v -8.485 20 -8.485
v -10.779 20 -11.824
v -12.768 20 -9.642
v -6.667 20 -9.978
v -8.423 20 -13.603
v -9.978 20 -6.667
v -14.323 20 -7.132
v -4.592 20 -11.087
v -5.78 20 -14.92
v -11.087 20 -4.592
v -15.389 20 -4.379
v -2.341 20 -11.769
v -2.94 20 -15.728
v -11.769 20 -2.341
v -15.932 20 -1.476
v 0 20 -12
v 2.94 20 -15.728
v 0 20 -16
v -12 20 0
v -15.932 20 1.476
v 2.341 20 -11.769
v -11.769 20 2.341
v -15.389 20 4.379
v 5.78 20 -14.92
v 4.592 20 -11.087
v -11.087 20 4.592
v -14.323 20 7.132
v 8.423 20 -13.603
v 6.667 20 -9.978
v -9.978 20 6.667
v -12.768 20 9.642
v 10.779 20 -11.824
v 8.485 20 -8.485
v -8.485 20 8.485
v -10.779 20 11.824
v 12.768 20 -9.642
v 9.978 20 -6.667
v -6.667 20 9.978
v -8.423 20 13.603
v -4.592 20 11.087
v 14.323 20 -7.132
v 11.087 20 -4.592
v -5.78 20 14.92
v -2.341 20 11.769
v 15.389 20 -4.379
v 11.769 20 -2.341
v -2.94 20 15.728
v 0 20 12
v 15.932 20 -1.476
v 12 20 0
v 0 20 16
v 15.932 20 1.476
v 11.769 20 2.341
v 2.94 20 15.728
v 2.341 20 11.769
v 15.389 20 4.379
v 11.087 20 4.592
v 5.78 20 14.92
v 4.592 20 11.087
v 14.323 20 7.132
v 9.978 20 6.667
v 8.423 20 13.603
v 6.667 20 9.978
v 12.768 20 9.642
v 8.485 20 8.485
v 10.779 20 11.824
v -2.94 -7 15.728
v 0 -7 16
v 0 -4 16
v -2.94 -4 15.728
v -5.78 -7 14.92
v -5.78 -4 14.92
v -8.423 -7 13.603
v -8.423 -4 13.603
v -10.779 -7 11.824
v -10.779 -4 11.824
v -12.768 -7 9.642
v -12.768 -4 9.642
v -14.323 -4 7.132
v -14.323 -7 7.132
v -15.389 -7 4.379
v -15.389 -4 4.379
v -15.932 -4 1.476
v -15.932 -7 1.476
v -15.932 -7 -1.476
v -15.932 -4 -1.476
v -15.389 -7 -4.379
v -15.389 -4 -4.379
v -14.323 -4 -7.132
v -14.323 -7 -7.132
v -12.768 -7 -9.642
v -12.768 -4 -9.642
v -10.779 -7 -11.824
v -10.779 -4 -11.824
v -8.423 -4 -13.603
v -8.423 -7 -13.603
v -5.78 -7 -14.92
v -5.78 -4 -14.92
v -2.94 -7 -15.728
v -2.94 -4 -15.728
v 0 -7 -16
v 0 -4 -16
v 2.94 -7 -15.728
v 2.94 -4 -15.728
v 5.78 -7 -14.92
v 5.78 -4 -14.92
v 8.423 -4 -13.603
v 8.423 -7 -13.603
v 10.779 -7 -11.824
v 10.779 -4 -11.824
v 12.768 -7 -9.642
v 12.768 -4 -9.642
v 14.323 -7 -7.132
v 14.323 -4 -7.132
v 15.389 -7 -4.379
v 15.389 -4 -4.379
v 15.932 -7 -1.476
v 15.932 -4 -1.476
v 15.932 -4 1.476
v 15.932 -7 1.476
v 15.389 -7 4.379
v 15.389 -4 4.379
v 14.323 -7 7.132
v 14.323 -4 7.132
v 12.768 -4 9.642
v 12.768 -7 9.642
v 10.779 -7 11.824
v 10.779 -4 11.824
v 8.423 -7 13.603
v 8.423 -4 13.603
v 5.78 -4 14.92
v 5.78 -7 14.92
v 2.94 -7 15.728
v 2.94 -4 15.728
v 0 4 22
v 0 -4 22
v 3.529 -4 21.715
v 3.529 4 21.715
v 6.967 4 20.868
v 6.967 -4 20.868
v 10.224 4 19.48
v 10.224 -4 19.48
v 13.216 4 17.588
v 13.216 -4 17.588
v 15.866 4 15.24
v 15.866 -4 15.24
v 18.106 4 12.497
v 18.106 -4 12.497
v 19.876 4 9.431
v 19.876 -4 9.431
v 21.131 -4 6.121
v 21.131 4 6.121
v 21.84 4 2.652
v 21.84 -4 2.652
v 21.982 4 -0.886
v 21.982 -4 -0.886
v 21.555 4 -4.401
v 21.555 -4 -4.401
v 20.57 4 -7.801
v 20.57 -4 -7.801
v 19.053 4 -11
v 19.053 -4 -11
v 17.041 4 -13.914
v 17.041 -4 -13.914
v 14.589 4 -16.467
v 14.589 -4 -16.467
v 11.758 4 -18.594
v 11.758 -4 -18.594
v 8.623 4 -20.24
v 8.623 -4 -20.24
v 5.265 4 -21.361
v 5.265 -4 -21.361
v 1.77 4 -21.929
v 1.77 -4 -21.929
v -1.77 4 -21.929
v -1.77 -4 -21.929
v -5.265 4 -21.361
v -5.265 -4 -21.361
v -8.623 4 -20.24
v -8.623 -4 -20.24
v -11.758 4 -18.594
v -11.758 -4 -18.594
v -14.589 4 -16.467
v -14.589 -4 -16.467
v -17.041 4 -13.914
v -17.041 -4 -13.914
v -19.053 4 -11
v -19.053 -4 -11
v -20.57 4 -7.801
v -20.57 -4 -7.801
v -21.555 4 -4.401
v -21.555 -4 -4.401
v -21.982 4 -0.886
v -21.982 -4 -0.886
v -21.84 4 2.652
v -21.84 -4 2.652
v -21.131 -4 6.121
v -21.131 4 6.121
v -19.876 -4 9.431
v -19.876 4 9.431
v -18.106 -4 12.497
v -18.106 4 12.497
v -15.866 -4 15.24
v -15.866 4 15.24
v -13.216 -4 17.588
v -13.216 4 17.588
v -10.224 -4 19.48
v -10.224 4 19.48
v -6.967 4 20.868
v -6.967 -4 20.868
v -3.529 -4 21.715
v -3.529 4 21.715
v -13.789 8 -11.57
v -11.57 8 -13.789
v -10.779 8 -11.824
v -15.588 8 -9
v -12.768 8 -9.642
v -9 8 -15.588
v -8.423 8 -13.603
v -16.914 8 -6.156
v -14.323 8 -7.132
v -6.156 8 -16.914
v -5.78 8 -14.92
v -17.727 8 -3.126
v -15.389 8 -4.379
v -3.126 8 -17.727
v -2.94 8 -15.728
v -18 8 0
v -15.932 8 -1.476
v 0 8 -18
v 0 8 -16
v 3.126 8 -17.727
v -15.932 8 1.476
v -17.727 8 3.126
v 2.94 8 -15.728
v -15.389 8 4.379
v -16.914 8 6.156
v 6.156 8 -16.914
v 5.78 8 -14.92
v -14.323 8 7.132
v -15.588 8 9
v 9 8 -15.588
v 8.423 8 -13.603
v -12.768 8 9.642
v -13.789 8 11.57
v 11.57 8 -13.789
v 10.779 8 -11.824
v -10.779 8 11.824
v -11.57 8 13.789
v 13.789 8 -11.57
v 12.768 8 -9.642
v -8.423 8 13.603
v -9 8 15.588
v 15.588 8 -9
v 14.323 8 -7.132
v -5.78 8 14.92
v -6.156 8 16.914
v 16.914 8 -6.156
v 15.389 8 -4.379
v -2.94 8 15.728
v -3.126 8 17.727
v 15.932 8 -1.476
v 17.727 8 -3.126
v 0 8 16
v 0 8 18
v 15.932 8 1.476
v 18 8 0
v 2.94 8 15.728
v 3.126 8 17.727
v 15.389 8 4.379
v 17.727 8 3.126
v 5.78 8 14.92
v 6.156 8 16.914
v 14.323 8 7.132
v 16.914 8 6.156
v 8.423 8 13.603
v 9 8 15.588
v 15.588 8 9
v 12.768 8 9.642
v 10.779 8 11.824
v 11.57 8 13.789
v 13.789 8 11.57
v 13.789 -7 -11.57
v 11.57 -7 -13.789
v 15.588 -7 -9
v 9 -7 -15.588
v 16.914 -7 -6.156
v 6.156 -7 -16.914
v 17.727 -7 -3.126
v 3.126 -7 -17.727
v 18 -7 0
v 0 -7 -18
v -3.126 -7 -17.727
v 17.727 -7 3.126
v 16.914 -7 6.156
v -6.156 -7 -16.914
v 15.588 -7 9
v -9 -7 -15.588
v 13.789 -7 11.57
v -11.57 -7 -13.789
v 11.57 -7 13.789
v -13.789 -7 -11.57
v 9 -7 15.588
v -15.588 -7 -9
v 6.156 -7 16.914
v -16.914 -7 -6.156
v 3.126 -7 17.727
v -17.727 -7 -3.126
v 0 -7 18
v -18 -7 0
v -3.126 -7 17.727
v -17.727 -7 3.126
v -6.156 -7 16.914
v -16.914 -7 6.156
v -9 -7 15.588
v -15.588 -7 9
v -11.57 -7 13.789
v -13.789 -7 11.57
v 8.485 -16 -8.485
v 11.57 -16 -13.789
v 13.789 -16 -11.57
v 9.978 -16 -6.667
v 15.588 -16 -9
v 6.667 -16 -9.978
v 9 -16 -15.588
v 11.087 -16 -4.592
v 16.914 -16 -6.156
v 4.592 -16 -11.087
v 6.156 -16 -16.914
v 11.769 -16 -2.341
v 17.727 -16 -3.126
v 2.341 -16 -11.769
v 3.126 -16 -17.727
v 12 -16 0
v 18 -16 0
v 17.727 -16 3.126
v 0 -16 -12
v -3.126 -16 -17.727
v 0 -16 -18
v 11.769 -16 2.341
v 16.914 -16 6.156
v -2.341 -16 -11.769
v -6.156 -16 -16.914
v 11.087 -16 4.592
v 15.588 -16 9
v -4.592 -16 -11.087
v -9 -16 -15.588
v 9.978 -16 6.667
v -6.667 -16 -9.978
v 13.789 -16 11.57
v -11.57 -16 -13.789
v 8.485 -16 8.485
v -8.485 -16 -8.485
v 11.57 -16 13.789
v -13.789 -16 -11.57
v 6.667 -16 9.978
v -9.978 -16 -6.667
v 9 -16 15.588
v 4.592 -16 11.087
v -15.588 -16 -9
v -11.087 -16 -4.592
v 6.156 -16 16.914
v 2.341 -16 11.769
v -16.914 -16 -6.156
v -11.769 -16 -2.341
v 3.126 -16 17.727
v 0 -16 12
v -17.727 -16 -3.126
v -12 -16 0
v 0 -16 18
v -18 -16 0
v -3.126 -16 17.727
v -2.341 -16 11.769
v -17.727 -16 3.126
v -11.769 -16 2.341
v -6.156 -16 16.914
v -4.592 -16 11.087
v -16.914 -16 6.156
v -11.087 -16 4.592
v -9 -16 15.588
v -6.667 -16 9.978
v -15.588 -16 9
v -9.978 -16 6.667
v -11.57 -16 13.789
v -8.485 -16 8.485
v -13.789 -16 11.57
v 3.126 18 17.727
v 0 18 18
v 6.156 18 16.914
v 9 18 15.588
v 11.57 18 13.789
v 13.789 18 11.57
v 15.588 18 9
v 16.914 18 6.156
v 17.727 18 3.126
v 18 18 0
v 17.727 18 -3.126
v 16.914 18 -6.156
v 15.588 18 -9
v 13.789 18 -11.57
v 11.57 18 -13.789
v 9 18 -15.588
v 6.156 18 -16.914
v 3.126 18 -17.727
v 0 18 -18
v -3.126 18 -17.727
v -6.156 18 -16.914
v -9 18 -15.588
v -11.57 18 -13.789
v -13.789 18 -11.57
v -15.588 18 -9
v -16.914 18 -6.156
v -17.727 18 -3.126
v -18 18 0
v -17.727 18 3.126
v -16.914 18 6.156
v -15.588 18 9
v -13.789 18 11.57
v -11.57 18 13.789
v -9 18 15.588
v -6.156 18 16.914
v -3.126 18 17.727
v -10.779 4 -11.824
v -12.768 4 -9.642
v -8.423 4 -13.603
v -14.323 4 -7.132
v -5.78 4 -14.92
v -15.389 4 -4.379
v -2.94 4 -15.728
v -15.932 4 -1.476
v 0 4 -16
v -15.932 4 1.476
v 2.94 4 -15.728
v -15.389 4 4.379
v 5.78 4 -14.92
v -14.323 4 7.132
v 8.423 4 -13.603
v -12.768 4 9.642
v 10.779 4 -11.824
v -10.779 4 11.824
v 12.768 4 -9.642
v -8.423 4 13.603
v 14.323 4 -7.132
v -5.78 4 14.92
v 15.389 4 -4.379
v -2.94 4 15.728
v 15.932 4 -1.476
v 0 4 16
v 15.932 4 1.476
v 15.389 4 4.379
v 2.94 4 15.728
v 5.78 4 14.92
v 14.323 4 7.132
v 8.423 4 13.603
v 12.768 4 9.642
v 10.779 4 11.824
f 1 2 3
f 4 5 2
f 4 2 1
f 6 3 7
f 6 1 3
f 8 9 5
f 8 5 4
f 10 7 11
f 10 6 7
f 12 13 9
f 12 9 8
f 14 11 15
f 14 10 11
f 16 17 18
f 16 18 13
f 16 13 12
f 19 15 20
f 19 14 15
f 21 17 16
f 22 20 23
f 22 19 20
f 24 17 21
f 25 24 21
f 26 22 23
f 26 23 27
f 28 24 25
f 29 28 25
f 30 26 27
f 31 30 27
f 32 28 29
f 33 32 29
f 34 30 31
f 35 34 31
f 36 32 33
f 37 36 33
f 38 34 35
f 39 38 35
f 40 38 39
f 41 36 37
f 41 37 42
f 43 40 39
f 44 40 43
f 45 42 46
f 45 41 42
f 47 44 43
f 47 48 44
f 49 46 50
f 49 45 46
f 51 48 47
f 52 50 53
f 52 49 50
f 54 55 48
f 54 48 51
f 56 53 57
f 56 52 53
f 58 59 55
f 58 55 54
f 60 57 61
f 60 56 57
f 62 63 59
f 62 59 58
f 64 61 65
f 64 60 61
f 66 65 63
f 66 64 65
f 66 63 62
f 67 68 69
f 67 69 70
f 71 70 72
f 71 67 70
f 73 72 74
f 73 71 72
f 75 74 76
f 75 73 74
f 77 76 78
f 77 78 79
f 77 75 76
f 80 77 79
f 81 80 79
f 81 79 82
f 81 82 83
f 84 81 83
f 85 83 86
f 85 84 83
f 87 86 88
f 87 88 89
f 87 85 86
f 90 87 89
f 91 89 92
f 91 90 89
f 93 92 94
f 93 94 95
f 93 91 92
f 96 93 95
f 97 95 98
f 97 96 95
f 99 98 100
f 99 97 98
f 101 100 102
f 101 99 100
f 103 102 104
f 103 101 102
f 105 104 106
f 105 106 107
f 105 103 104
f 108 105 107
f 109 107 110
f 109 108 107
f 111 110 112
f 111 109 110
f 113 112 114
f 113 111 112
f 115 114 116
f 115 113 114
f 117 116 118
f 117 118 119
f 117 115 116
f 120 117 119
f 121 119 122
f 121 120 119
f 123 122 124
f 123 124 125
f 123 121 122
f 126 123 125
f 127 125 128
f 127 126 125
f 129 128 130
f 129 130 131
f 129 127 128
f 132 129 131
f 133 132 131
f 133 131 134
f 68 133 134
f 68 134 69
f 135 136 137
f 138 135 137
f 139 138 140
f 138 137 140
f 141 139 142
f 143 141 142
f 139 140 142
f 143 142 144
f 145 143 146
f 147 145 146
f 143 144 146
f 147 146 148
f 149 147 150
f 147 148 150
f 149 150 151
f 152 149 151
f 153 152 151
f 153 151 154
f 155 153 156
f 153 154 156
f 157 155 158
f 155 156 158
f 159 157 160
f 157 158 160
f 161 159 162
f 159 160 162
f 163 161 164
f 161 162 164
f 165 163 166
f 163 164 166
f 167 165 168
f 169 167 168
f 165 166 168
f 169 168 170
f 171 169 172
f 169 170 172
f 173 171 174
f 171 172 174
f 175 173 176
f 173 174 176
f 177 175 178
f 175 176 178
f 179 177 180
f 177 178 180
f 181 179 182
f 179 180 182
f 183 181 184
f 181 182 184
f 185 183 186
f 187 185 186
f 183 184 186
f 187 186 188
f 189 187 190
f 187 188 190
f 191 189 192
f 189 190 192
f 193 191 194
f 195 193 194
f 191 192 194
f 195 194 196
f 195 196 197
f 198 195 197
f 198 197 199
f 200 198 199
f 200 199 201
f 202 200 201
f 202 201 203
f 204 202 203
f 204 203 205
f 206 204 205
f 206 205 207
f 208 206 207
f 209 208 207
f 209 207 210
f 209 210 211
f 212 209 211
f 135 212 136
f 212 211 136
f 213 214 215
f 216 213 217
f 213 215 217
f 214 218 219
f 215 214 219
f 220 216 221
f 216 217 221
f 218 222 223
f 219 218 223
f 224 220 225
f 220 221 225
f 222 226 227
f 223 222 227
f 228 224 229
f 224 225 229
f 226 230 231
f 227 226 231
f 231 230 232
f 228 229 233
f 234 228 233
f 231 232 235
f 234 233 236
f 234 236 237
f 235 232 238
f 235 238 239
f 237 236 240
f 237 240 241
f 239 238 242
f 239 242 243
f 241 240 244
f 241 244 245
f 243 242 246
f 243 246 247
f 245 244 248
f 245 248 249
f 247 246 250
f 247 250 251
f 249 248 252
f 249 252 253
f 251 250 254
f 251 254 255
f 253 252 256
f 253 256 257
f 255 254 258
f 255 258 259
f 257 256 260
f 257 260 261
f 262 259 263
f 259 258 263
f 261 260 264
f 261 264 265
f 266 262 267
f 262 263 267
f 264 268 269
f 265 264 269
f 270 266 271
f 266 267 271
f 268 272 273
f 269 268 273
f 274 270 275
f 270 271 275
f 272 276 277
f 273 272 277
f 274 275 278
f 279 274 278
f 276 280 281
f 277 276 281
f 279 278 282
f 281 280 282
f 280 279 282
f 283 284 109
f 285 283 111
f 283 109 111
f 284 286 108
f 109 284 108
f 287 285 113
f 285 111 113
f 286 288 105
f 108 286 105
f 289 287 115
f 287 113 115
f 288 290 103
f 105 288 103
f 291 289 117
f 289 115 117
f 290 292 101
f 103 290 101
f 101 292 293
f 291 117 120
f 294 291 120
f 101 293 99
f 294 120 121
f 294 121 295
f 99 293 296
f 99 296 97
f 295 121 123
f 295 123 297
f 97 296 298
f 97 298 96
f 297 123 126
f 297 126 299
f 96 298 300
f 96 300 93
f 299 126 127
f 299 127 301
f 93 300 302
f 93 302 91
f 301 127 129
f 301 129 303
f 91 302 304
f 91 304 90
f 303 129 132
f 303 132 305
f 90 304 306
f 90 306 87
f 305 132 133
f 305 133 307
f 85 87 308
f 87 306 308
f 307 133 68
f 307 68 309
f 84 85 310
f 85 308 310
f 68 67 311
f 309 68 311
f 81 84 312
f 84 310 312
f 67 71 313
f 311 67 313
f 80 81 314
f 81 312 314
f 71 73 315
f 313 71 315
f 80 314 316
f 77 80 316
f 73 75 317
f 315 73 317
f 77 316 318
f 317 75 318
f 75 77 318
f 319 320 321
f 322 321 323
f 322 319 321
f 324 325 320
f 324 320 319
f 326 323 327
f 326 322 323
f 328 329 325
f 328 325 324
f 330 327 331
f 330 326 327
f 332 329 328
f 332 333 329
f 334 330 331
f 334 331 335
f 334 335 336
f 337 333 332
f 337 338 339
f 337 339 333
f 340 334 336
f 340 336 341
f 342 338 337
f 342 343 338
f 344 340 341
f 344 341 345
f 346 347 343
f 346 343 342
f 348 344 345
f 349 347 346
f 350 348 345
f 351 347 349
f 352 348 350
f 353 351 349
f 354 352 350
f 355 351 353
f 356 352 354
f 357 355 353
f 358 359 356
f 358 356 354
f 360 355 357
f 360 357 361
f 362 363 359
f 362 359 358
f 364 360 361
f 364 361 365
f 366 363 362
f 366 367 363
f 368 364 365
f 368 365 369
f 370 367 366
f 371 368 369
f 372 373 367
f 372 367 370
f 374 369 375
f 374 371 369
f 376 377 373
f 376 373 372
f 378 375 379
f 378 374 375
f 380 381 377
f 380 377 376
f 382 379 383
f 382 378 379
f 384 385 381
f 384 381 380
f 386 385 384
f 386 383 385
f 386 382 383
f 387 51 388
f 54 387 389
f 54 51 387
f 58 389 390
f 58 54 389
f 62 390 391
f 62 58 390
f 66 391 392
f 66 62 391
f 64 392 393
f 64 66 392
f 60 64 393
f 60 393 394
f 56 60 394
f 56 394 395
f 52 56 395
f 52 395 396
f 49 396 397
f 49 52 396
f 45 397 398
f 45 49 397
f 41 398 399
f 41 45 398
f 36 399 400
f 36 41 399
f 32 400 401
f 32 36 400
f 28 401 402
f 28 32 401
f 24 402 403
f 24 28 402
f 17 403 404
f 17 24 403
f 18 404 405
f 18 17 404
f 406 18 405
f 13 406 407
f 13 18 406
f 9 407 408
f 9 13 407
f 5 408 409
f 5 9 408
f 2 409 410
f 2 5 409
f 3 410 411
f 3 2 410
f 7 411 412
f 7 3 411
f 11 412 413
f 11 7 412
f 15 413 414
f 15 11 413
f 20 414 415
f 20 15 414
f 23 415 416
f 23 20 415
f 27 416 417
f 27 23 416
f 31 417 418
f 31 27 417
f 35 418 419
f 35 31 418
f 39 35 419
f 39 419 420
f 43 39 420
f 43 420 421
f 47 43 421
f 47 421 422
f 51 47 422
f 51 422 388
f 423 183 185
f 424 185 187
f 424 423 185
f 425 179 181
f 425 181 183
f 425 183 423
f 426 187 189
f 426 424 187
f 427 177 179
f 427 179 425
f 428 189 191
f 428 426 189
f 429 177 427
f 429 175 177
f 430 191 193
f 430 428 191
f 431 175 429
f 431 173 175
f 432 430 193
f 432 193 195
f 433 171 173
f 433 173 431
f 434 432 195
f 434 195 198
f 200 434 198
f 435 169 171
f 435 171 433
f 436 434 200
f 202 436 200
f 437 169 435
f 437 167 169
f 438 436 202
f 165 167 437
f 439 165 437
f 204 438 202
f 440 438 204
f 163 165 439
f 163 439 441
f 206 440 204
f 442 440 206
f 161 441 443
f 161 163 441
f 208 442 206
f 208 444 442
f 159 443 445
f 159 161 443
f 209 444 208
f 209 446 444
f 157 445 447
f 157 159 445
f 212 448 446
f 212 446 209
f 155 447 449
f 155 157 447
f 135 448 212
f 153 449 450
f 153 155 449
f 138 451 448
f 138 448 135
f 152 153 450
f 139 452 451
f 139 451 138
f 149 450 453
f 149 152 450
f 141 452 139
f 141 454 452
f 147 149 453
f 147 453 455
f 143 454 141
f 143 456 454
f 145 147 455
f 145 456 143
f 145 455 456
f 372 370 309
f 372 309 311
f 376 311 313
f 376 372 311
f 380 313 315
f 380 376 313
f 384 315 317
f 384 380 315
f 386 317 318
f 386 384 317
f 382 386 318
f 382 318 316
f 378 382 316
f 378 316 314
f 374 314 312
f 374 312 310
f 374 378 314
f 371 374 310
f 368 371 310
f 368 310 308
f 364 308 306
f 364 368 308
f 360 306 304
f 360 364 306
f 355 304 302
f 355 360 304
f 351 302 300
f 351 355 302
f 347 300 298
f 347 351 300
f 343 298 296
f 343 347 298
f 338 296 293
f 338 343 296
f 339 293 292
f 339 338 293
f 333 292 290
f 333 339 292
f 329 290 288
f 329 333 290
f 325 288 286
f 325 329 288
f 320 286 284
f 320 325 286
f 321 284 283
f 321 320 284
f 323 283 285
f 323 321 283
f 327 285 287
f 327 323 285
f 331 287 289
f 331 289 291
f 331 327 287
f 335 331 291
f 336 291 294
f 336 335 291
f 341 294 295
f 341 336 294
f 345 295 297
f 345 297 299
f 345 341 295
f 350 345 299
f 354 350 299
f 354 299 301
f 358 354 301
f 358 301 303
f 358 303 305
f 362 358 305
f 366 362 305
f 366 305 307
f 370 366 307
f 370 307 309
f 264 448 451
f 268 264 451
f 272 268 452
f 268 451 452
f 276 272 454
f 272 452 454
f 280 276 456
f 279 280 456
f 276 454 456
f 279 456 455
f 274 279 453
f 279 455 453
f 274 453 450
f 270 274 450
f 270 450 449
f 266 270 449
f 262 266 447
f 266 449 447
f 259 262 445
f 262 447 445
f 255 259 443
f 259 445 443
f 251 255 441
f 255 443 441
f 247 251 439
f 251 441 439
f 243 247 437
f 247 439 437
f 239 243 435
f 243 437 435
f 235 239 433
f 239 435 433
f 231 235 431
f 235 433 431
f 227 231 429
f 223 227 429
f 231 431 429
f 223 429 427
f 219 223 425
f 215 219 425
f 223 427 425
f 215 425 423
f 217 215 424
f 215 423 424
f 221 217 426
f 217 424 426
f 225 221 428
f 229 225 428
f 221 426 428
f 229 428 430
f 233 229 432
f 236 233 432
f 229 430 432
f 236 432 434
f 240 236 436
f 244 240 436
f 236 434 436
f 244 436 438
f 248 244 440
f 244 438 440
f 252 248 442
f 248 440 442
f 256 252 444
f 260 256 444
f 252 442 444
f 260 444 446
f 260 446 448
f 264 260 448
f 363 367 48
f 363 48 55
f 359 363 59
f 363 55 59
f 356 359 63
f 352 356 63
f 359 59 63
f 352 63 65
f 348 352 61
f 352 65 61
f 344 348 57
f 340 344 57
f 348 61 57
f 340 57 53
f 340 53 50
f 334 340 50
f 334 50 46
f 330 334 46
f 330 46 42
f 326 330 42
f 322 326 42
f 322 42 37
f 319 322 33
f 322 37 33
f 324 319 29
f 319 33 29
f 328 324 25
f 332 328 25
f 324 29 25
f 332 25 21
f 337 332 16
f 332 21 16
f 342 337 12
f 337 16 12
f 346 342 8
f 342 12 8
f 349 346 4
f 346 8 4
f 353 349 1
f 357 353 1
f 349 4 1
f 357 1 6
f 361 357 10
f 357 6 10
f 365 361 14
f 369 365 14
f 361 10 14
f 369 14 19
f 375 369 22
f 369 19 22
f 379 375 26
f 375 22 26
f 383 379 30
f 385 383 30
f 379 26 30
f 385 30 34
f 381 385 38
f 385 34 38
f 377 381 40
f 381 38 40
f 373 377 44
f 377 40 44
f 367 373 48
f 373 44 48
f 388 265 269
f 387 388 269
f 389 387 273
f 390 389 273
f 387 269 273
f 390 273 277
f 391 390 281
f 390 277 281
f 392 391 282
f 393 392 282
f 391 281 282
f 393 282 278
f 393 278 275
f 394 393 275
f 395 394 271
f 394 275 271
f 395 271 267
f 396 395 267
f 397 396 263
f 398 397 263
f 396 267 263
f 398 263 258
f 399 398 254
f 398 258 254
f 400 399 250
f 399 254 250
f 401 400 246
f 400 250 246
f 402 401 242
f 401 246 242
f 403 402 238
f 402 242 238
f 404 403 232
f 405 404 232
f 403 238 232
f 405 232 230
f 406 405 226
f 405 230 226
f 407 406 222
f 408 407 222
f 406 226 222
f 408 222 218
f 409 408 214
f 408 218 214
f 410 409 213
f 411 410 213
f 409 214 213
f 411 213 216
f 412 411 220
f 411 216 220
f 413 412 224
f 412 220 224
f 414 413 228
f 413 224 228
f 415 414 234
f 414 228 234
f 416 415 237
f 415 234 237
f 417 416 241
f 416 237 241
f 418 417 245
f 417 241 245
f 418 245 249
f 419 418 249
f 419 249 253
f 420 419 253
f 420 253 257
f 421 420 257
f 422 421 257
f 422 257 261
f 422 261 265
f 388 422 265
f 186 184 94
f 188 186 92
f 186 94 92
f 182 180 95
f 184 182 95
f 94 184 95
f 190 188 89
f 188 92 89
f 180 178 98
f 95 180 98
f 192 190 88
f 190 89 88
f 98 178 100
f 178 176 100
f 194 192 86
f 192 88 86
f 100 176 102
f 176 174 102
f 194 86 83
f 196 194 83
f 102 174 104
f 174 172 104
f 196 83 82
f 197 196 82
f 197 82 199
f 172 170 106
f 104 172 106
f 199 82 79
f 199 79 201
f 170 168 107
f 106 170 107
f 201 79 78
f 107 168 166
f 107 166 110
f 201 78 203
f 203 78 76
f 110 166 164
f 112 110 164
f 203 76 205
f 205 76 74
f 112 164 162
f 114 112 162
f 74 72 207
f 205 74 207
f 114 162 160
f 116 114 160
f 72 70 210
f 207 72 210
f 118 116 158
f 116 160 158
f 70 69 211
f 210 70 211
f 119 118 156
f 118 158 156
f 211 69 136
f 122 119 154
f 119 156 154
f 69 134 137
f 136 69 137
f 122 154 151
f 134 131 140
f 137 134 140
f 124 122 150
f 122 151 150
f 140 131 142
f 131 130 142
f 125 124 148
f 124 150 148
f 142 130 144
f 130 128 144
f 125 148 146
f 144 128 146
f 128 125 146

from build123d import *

# Parameters (mm, degrees)
BOSS_EXTRUDE1_DEPTH      = 4
BOSS_EXTRUDE1_DEPTH_BACK = 4
SKETCH1_R                = 22
SKETCH2_R                = 16
BOSS_EXTRUDE2_DEPTH      = 4
SKETCH3_R                = 18
BOSS_EXTRUDE3_DEPTH      = 12
BOSS_EXTRUDE4_START      = 3
SKETCH4_R                = 16
BOSS_EXTRUDE4_DEPTH      = 3
BOSS_EXTRUDE5_START      = 9
SKETCH5_R                = 18
BOSS_EXTRUDE5_DEPTH      = 9
CHAMFER1_SIZE            = 2
SKETCH6_R                = 12
CUT_EXTRUDE1_DEPTH       = 36


with BuildPart() as part:
    # Sketch1 → Boss-Extrude1 (new, two sides: drawn at the far end of the back side and taken through both)
    with BuildSketch(Plane(origin=(0, 0, 0), x_dir=(1, 0, 0), z_dir=(0, 1, 0)).offset(-BOSS_EXTRUDE1_DEPTH_BACK)):
        with Locations(Location((0, 0, 0), (0, 0, 270))):
            Circle(SKETCH1_R)
    extrude(amount=BOSS_EXTRUDE1_DEPTH + BOSS_EXTRUDE1_DEPTH_BACK)

    # Sketch2 → Boss-Extrude2 (add)
    with BuildSketch(Plane(origin=(0, 4, 0), x_dir=(1, 0, 0), z_dir=(0, 1, 0))):
        with Locations(Location((0, 0, 0), (0, 0, 270))):
            Circle(SKETCH2_R)
    extrude(amount=BOSS_EXTRUDE2_DEPTH)

    # Sketch3 → Boss-Extrude3 (add)
    with BuildSketch(Plane(origin=(0, 8, 0), x_dir=(1, 0, 0), z_dir=(0, 1, 0))):
        with Locations(Location((0, 0, 0), (0, 0, 270))):
            Circle(SKETCH3_R)
    extrude(amount=BOSS_EXTRUDE3_DEPTH)

    # Sketch4 → Boss-Extrude4 (add)
    with BuildSketch(Plane.XZ.offset(4).offset(BOSS_EXTRUDE4_START)):
        with Locations(Location((0, 0, 0), (0, 0, 90))):
            Circle(SKETCH4_R)
    extrude(amount=-BOSS_EXTRUDE4_DEPTH)

    # Sketch5 → Boss-Extrude5 (add)
    with BuildSketch(Plane.XZ.offset(7).offset(BOSS_EXTRUDE5_START)):
        with Locations(Location((0, 0, 0), (0, 0, 90))):
            Circle(SKETCH5_R)
    extrude(amount=-BOSS_EXTRUDE5_DEPTH)

    # Chamfer1
    chamfer1_edges = [part.edges().sort_by_distance(p)[0] for p in [
        (0, 20, -18),
    ]]
    chamfer(chamfer1_edges, length=CHAMFER1_SIZE)

    # Sketch6 → Cut-Extrude1 (cut)
    with BuildSketch(Plane(origin=(0, 20, 0), x_dir=(1, 0, 0), z_dir=(0, 1, 0))):
        with Locations(Location((0, 0, 0), (0, 0, 270))):
            Circle(SKETCH6_R)
    extrude(amount=-CUT_EXTRUDE1_DEPTH, mode=Mode.SUBTRACT)


solid = part.part
